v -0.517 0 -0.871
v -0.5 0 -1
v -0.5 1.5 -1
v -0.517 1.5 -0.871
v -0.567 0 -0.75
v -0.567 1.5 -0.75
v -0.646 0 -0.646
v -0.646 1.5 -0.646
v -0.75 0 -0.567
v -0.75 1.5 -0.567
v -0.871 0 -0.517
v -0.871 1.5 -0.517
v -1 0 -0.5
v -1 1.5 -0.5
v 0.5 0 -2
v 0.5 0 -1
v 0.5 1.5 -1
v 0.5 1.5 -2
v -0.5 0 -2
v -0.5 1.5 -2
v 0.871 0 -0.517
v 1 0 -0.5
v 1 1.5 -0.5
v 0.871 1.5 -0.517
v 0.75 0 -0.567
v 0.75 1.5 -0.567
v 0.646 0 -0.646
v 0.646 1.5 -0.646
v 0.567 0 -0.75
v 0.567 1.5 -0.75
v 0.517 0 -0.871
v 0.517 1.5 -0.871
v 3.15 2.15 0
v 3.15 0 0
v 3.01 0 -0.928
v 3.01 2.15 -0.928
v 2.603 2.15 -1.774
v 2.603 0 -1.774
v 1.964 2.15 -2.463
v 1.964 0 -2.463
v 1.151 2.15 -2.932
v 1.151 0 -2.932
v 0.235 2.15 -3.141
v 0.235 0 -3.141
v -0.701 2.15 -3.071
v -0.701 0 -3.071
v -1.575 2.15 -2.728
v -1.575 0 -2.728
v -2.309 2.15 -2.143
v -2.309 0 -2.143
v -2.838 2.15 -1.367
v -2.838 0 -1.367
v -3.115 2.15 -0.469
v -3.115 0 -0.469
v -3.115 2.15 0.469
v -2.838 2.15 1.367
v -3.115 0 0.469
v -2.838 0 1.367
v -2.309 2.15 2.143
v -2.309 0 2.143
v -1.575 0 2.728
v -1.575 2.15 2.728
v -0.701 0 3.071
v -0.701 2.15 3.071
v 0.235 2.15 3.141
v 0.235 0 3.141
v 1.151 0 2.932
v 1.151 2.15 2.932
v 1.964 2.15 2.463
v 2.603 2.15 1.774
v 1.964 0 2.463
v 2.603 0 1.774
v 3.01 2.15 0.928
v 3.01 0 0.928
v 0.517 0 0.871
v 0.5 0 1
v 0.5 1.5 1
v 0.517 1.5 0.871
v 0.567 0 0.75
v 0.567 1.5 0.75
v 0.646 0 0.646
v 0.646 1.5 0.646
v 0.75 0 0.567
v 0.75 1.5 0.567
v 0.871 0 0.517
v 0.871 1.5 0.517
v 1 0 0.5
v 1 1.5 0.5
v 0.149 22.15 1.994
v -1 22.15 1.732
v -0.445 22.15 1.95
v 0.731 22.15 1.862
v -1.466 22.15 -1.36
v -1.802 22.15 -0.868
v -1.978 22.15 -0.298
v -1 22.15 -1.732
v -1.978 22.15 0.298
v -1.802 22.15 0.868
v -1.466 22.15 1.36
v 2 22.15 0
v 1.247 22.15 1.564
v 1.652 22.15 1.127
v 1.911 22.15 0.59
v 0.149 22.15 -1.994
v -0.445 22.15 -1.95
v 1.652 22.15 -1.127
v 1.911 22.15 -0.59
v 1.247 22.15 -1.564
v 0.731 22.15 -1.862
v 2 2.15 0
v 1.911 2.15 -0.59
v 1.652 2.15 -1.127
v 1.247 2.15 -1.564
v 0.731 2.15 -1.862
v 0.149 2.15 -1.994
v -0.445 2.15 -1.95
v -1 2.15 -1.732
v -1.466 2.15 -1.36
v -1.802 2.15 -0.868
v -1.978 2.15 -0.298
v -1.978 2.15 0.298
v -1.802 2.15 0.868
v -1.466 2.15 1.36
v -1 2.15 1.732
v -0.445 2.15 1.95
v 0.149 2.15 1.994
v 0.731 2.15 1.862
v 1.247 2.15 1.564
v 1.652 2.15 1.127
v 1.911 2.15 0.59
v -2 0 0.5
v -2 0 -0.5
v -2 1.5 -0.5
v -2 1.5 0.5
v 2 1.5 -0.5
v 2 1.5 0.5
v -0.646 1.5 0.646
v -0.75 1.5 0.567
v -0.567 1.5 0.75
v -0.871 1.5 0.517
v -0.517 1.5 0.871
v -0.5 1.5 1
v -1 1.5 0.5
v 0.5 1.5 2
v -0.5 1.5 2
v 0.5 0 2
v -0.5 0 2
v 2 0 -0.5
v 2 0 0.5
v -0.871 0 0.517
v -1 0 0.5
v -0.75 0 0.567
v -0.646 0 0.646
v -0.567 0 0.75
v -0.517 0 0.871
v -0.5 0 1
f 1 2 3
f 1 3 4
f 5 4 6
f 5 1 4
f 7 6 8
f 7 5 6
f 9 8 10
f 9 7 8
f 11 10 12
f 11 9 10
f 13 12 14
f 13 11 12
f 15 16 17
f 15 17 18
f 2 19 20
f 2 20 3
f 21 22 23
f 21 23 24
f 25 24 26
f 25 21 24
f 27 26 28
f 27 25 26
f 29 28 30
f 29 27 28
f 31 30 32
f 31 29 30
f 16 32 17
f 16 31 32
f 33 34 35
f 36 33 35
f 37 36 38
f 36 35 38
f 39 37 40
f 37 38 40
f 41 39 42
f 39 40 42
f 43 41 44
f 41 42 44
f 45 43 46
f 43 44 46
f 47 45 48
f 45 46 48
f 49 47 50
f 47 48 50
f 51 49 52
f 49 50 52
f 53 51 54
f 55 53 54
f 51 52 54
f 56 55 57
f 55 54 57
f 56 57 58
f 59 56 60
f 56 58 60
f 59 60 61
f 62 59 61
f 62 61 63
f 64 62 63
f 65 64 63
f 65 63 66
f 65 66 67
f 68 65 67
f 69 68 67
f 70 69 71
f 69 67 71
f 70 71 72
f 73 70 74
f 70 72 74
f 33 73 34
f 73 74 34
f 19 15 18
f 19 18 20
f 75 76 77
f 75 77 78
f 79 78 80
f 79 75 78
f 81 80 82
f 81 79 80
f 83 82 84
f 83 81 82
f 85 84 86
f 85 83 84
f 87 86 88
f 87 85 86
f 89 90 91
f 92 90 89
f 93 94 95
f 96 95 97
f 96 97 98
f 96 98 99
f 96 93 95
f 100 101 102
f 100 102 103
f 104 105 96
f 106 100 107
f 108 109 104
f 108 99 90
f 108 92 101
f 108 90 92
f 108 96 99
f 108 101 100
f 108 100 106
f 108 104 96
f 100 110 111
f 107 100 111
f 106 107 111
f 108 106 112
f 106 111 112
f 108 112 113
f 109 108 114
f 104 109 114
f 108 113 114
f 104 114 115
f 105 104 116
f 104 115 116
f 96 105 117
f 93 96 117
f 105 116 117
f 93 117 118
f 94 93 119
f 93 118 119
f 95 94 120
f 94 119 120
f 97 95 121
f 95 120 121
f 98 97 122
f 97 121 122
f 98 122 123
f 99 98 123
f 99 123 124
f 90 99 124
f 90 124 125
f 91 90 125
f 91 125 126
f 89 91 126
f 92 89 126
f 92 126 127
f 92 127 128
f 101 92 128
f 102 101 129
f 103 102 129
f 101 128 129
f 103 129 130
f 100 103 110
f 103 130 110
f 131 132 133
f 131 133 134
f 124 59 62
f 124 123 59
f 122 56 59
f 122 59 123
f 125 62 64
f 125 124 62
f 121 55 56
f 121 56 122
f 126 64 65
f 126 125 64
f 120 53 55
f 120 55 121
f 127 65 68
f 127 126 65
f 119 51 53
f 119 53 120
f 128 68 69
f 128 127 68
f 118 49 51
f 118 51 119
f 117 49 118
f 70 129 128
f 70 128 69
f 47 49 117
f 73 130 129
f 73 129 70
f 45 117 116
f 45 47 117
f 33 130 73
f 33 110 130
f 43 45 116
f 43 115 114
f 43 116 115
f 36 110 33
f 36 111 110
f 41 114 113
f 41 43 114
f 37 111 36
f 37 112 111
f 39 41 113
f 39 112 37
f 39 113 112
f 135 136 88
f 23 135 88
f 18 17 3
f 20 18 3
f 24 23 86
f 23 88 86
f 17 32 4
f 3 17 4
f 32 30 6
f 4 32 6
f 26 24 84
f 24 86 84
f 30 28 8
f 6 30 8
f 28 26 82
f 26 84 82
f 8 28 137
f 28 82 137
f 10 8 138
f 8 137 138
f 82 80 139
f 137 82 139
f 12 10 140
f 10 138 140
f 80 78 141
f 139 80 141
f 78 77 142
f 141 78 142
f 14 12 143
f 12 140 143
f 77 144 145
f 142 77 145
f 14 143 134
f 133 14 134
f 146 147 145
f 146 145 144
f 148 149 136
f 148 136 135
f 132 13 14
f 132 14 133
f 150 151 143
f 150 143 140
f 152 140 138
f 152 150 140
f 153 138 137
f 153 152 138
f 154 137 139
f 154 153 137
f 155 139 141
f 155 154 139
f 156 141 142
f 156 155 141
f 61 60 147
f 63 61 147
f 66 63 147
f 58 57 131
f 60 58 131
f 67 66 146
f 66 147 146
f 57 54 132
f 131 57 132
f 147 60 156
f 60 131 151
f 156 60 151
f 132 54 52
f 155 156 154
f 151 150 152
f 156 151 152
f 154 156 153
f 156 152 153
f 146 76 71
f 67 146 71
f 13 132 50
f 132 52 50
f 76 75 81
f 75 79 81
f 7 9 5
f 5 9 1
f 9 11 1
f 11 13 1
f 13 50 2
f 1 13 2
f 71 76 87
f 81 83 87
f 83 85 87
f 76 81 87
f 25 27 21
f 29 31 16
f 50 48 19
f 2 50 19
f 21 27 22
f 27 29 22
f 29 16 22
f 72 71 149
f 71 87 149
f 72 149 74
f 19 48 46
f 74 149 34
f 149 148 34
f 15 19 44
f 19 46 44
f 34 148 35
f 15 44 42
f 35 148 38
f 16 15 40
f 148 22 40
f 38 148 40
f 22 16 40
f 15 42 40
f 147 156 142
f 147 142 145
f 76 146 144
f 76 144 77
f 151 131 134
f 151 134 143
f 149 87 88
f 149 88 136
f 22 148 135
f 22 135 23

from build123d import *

# Parameters (mm, degrees)
SKETCH_1_R          = 3.15
EXTRUDE_1_DEPTH     = 2.15
SKETCH_2_R          = 2
EXTRUDE_2_DEPTH     = 20
CUT_EXTRUDE_1_DEPTH = 1.5


with BuildPart() as part:
    # 草图1 → 凸台-拉伸1 (new body)
    with BuildSketch(Plane(origin=(0, 0, 0), x_dir=(1, 0, 0), z_dir=(0, 1, 0))):
        Circle(SKETCH_1_R)
    extrude(amount=EXTRUDE_1_DEPTH)

    # 草图2 → 凸台-拉伸2 (add)
    with BuildSketch(Plane(origin=(0, 2.15, 0), x_dir=(1, 0, 0), z_dir=(0, 1, 0))):
        Circle(SKETCH_2_R)
    extrude(amount=EXTRUDE_2_DEPTH)

    # 草图3 → 切除-拉伸1 (cut)
    with BuildSketch(Plane.XZ):
        with BuildLine():
            Line((-0.5, 1), (-0.5, 2))
            Line((-0.5, 2), (0.5, 2))
            Line((0.5, 2), (0.5, 1))
            ThreePointArc((0.5, 1), (0.646446609, 0.646446609), (1, 0.5))
            Line((1, 0.5), (2, 0.5))
            Line((2, 0.5), (2, -0.5))
            Line((2, -0.5), (1, -0.5))
            ThreePointArc((1, -0.5), (0.646446609, -0.646446609), (0.5, -1))
            Line((0.5, -1), (0.5, -2))
            Line((0.5, -2), (-0.5, -2))
            Line((-0.5, -2), (-0.5, -1))
            ThreePointArc((-0.5, -1), (-0.646446609, -0.646446609), (-1, -0.5))
            Line((-1, -0.5), (-2, -0.5))
            Line((-2, -0.5), (-2, 0.5))
            Line((-2, 0.5), (-1, 0.5))
            ThreePointArc((-1, 0.5), (-0.646446609, 0.646446609), (-0.5, 1))
        make_face()
    extrude(amount=-CUT_EXTRUDE_1_DEPTH, mode=Mode.SUBTRACT)


solid = part.part
